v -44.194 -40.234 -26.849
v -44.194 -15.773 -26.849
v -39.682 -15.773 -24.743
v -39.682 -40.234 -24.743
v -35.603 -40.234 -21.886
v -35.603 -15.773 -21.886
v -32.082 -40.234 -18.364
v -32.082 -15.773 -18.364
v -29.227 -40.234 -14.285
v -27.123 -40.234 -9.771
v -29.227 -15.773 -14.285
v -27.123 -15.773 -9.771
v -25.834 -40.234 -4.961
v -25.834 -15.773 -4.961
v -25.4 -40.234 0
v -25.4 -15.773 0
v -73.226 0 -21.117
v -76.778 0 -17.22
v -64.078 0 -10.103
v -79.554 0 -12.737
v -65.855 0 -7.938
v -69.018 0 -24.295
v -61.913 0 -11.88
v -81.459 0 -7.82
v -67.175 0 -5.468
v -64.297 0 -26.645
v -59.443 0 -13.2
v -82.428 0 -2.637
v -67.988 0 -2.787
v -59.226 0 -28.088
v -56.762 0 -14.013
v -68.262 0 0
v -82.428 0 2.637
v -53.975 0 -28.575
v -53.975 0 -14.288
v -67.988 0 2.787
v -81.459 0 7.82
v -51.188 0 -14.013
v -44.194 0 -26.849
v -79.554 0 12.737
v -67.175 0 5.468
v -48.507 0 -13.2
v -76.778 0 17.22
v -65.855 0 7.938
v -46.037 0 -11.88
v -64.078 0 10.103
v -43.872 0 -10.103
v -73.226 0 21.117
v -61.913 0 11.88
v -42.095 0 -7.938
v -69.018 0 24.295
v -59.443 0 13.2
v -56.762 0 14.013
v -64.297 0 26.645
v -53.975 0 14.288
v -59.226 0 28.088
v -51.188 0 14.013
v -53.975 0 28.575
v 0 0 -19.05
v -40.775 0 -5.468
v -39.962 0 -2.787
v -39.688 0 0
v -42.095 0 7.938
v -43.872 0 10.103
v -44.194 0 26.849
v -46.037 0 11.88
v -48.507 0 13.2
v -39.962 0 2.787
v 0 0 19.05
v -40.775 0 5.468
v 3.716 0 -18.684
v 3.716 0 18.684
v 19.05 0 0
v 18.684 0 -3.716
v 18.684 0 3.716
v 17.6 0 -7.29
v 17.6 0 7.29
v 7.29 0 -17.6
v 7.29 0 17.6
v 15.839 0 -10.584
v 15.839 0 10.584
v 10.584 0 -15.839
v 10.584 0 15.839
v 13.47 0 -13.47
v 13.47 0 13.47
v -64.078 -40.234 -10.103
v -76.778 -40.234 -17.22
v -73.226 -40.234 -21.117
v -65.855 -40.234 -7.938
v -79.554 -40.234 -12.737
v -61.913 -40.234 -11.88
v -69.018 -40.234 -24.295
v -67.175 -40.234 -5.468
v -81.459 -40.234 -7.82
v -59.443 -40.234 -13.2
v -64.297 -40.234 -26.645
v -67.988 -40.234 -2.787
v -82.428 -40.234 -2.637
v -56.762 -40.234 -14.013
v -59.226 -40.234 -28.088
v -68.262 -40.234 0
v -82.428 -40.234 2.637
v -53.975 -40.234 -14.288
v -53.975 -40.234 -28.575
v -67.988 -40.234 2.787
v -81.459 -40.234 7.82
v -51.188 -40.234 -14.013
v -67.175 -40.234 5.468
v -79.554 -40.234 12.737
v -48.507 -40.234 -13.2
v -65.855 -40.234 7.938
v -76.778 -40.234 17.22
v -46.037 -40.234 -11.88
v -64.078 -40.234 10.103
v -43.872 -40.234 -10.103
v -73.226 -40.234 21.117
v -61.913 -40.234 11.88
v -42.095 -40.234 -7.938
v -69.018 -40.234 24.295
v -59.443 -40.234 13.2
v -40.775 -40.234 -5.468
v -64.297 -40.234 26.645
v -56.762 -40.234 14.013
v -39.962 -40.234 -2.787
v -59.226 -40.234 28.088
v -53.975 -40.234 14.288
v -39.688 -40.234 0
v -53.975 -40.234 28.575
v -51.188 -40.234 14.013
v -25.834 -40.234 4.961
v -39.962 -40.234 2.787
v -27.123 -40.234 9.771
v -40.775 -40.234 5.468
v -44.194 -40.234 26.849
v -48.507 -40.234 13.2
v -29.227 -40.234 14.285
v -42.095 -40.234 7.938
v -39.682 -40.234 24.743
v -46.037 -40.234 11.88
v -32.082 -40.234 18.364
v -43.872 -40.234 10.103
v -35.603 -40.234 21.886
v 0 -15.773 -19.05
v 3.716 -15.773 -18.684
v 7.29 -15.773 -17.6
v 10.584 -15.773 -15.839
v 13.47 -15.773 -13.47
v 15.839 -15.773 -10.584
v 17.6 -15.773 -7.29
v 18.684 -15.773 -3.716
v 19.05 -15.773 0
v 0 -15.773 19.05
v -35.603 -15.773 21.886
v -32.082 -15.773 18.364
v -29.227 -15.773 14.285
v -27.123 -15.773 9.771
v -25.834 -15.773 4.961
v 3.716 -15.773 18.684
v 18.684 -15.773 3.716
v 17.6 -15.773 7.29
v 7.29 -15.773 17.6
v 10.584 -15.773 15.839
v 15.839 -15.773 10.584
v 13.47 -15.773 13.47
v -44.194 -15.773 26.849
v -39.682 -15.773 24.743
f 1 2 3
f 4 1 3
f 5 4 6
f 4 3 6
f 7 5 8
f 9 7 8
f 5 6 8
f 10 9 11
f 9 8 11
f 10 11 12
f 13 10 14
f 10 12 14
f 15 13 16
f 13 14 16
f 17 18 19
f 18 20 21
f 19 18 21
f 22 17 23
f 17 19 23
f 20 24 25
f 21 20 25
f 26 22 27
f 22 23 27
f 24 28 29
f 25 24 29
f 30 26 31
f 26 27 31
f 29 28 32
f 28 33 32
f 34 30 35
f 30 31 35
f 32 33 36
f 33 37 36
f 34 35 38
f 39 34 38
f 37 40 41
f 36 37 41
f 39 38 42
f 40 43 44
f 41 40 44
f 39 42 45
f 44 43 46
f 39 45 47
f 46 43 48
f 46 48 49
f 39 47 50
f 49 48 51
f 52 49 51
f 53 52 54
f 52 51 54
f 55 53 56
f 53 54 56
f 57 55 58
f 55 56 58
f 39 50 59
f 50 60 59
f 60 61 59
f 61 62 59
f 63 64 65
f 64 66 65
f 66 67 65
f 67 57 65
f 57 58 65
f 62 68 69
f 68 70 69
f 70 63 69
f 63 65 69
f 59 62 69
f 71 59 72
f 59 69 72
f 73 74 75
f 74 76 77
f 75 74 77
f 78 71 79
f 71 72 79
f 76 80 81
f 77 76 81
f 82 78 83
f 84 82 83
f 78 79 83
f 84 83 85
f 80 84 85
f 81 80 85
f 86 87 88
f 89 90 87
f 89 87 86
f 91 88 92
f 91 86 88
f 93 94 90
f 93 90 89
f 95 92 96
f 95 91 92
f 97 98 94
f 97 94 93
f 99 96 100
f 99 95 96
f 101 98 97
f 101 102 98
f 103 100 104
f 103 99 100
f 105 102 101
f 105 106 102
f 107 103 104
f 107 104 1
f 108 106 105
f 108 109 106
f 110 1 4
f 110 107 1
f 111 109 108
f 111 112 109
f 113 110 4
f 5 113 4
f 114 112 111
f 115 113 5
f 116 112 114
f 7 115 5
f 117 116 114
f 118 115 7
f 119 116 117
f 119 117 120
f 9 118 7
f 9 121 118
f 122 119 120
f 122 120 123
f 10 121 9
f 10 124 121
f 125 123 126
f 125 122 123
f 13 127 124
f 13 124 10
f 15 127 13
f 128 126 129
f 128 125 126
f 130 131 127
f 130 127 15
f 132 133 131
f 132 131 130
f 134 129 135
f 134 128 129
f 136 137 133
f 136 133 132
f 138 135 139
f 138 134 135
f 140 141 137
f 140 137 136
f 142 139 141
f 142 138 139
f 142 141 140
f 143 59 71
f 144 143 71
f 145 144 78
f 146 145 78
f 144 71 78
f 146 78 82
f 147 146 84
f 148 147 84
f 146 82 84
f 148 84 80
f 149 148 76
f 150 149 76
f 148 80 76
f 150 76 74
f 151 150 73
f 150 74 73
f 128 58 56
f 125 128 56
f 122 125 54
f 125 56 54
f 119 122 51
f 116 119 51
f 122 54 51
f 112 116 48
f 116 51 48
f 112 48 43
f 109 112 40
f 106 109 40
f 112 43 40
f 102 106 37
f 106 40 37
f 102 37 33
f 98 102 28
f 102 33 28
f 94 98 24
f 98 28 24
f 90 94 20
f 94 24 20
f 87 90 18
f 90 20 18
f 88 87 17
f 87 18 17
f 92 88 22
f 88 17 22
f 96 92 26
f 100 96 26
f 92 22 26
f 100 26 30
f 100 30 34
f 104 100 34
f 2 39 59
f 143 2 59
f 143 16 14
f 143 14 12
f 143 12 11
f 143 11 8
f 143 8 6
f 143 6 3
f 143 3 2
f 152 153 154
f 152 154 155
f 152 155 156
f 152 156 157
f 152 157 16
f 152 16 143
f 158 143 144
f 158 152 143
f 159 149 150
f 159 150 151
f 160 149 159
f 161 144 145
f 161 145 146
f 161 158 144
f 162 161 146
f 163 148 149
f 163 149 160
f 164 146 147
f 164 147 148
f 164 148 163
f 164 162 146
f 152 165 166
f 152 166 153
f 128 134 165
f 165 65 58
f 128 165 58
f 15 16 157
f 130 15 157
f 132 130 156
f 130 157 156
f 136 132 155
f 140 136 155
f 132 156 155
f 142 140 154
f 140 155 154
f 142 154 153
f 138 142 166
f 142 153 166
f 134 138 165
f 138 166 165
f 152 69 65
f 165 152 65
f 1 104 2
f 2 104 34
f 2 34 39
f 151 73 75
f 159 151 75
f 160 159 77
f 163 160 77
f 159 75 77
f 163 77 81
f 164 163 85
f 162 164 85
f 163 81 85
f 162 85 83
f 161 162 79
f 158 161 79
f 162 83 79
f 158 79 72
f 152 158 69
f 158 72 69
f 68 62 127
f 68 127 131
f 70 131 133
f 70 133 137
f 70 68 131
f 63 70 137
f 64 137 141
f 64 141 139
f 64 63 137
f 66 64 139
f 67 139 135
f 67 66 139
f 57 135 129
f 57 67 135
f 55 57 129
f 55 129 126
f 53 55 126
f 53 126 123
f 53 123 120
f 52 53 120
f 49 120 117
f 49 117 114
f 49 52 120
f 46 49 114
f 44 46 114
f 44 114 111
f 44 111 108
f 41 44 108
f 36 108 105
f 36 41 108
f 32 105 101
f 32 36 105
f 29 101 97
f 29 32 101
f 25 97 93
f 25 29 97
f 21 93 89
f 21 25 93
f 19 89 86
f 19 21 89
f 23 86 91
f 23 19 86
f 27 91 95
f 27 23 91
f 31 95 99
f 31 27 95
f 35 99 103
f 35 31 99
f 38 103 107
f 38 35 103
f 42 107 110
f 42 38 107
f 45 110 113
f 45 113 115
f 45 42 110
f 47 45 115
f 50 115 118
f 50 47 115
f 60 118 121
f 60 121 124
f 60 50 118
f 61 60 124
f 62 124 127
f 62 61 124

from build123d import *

# Parameters (mm, degrees)
F0_R     = 14.2875
F1_DEPTH = 40.2336
F2_DEPTH = 15.7734


with BuildPart() as f1:
    # F0 (on Front) → F1 (new body)
    with BuildSketch(Plane.XZ):
        with BuildLine():
            ThreePointArc((-44.194295302, -26.8489932886), (-30.5654478712, -16.3866864902), (-25.4, 0))
            ThreePointArc((-25.4, 0), (-30.5654478712, 16.3866864902), (-44.194295302, 26.8489932886))
            Line((-44.194295302, 26.8489932886), (-53.975, 28.575))
            ThreePointArc((-53.975, 28.575), (-82.55, 0), (-53.975, -28.575))
            Line((-53.975, -28.575), (-44.194295302, -26.8489932886))
        make_face()
        with Locations((-53.975, 0)):
            Circle(F0_R, mode=Mode.SUBTRACT)
    extrude(amount=F1_DEPTH)

    # F0 (on Front) → F2 (join)
    with BuildSketch(Plane.XZ):
        with BuildLine():
            ThreePointArc((0, 19.05), (-13.4703841816, 13.4703841816), (-19.05, 0))
            ThreePointArc((-19.05, 0), (-13.4703841816, -13.4703841816), (0, -19.05))
            ThreePointArc((0, -19.05), (13.4703841816, -13.4703841816), (19.05, 0))
            ThreePointArc((19.05, 0), (13.4703841816, 13.4703841816), (0, 19.05))
        make_face()
        with BuildLine():
            ThreePointArc((-10.16, 0), (0, 10.16), (10.16, 0))
            ThreePointArc((10.16, 0), (0, -10.16), (-10.16, 0))
        make_face(mode=Mode.SUBTRACT)
        with BuildLine():
            Line((-25.4, 0), (-19.05, 0))
            ThreePointArc((-19.05, 0), (-13.4703841816, 13.4703841816), (0, 19.05))
            Line((0, 19.05), (-44.194295302, 26.8489932886))
            ThreePointArc((-44.194295302, 26.8489932886), (-30.5654478712, 16.3866864902), (-25.4, 0))
        make_face()
        with BuildLine():
            ThreePointArc((0, -19.05), (-13.4703841816, -13.4703841816), (-19.05, 0))
            Line((-19.05, 0), (-25.4, 0))
            ThreePointArc((-25.4, 0), (-30.5654478712, -16.3866864902), (-44.194295302, -26.8489932886))
            Line((-44.194295302, -26.8489932886), (0, -19.05))
        make_face()
        with BuildLine():
            ThreePointArc((-10.16, 0), (0, -10.16), (10.16, 0))
            ThreePointArc((10.16, 0), (0, 10.16), (-10.16, 0))
        make_face()
    extrude(amount=F2_DEPTH)


solid = f1.part
